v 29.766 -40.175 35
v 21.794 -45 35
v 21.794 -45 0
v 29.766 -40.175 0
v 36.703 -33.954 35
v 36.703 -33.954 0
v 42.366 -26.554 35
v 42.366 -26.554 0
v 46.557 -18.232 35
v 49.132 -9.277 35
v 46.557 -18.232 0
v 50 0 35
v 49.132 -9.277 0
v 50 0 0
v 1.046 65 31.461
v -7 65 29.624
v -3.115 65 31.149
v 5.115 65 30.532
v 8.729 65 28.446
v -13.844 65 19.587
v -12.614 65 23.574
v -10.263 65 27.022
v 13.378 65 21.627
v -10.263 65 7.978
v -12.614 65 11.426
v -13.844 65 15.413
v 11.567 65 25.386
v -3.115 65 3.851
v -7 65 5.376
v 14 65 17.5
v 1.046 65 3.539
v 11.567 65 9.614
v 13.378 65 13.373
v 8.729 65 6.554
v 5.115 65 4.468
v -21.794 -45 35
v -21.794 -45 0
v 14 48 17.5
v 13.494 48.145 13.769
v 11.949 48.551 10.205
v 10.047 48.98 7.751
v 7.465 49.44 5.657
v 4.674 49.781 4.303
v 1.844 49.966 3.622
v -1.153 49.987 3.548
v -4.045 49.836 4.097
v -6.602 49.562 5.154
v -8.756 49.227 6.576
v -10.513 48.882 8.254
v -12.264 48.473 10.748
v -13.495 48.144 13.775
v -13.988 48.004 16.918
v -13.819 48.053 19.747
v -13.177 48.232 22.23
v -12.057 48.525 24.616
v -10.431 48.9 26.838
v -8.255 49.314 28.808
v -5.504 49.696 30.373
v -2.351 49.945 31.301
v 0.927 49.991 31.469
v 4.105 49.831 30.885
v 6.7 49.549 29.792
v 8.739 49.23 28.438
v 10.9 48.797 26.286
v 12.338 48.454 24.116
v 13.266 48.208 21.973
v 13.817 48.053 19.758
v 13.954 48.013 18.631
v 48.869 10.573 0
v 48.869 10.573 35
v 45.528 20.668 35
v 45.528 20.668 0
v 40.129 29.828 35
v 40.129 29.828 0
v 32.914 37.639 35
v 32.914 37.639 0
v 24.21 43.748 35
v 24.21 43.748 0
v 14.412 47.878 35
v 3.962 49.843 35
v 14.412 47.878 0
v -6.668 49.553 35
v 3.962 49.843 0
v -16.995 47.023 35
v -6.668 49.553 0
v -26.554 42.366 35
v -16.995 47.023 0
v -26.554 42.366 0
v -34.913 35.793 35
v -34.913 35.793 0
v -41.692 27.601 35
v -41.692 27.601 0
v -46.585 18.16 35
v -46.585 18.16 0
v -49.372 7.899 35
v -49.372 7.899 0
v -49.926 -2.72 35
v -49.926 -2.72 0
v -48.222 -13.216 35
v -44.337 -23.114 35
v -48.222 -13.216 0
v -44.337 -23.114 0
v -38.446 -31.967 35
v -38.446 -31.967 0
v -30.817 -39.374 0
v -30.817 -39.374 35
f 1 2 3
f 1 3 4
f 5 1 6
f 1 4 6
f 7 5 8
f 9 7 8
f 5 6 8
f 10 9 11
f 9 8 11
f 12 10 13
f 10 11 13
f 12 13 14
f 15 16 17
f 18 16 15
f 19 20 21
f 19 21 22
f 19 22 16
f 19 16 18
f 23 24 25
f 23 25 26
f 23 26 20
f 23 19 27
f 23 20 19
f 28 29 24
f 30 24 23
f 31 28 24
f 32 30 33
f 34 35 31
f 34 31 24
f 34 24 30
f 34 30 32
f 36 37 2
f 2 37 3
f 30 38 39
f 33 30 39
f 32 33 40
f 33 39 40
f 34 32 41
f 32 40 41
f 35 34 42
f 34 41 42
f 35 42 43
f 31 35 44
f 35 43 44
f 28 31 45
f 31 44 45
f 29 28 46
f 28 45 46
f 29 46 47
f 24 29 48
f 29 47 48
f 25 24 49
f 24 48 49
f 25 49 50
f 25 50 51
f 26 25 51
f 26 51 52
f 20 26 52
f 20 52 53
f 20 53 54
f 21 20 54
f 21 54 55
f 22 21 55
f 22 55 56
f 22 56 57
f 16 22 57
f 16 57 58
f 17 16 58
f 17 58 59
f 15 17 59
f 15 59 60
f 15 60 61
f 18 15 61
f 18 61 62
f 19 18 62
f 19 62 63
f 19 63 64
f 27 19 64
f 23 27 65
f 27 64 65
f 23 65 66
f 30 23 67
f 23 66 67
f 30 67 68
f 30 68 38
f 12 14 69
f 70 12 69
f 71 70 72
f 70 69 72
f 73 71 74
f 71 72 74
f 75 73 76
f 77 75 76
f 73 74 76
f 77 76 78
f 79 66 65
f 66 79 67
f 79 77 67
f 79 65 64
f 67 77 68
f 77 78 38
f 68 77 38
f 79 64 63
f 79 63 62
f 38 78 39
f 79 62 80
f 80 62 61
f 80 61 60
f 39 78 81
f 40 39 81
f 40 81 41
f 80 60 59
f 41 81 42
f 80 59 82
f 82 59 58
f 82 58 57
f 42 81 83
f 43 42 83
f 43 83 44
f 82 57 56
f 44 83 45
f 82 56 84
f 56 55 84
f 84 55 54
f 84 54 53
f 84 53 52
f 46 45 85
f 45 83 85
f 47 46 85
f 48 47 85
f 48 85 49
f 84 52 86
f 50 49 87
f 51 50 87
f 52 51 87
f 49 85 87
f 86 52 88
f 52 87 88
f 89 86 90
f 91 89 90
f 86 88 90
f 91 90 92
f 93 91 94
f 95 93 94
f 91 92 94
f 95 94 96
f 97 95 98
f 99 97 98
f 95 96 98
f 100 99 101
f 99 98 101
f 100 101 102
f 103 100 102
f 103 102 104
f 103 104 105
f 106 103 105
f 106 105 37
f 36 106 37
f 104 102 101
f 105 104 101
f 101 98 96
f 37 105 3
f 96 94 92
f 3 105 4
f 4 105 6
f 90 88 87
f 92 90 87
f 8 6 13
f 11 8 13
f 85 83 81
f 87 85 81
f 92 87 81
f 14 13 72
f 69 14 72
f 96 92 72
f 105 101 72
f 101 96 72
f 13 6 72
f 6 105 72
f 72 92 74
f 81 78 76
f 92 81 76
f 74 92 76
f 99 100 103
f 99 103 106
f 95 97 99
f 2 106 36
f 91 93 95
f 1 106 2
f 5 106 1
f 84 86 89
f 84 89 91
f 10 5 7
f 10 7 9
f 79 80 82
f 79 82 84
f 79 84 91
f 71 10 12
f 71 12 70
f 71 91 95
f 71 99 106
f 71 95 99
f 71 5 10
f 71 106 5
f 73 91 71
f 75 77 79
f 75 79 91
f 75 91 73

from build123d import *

# Parameters (mm, degrees)
SKETCH_1_R          = 50
EXTRUDE_1_DEPTH     = 35
SKETCH_2_R          = 14
EXTRUDE_2_DEPTH     = 65
CUT_EXTRUDE_START   = -110
SKETCH_3_W          = 150
SKETCH_3_H          = 100
CUT_EXTRUDE_1_DEPTH = 64


with BuildPart() as part:
    # 草图1 → 凸台-拉伸1 (new body)
    with BuildSketch(Plane.XY):
        Circle(SKETCH_1_R)
    extrude(amount=EXTRUDE_1_DEPTH)

    # 草图2 → 凸台-拉伸2 (add)
    with BuildSketch(Plane(origin=(0, 0, 0), x_dir=(1, 0, 0), z_dir=(0, 1, 0))):
        with Locations((0, -17.5)):
            Circle(SKETCH_2_R)
    extrude(amount=EXTRUDE_2_DEPTH)

    # 草图3 → 切除-拉伸1 (cut)
    with BuildSketch(Plane(origin=(0, 65, 0), x_dir=(1, 0, 0), z_dir=(0, 1, 0)).offset(CUT_EXTRUDE_START)):
        Rectangle(SKETCH_3_W, SKETCH_3_H)
    extrude(amount=-CUT_EXTRUDE_1_DEPTH, mode=Mode.SUBTRACT)


solid = part.part
